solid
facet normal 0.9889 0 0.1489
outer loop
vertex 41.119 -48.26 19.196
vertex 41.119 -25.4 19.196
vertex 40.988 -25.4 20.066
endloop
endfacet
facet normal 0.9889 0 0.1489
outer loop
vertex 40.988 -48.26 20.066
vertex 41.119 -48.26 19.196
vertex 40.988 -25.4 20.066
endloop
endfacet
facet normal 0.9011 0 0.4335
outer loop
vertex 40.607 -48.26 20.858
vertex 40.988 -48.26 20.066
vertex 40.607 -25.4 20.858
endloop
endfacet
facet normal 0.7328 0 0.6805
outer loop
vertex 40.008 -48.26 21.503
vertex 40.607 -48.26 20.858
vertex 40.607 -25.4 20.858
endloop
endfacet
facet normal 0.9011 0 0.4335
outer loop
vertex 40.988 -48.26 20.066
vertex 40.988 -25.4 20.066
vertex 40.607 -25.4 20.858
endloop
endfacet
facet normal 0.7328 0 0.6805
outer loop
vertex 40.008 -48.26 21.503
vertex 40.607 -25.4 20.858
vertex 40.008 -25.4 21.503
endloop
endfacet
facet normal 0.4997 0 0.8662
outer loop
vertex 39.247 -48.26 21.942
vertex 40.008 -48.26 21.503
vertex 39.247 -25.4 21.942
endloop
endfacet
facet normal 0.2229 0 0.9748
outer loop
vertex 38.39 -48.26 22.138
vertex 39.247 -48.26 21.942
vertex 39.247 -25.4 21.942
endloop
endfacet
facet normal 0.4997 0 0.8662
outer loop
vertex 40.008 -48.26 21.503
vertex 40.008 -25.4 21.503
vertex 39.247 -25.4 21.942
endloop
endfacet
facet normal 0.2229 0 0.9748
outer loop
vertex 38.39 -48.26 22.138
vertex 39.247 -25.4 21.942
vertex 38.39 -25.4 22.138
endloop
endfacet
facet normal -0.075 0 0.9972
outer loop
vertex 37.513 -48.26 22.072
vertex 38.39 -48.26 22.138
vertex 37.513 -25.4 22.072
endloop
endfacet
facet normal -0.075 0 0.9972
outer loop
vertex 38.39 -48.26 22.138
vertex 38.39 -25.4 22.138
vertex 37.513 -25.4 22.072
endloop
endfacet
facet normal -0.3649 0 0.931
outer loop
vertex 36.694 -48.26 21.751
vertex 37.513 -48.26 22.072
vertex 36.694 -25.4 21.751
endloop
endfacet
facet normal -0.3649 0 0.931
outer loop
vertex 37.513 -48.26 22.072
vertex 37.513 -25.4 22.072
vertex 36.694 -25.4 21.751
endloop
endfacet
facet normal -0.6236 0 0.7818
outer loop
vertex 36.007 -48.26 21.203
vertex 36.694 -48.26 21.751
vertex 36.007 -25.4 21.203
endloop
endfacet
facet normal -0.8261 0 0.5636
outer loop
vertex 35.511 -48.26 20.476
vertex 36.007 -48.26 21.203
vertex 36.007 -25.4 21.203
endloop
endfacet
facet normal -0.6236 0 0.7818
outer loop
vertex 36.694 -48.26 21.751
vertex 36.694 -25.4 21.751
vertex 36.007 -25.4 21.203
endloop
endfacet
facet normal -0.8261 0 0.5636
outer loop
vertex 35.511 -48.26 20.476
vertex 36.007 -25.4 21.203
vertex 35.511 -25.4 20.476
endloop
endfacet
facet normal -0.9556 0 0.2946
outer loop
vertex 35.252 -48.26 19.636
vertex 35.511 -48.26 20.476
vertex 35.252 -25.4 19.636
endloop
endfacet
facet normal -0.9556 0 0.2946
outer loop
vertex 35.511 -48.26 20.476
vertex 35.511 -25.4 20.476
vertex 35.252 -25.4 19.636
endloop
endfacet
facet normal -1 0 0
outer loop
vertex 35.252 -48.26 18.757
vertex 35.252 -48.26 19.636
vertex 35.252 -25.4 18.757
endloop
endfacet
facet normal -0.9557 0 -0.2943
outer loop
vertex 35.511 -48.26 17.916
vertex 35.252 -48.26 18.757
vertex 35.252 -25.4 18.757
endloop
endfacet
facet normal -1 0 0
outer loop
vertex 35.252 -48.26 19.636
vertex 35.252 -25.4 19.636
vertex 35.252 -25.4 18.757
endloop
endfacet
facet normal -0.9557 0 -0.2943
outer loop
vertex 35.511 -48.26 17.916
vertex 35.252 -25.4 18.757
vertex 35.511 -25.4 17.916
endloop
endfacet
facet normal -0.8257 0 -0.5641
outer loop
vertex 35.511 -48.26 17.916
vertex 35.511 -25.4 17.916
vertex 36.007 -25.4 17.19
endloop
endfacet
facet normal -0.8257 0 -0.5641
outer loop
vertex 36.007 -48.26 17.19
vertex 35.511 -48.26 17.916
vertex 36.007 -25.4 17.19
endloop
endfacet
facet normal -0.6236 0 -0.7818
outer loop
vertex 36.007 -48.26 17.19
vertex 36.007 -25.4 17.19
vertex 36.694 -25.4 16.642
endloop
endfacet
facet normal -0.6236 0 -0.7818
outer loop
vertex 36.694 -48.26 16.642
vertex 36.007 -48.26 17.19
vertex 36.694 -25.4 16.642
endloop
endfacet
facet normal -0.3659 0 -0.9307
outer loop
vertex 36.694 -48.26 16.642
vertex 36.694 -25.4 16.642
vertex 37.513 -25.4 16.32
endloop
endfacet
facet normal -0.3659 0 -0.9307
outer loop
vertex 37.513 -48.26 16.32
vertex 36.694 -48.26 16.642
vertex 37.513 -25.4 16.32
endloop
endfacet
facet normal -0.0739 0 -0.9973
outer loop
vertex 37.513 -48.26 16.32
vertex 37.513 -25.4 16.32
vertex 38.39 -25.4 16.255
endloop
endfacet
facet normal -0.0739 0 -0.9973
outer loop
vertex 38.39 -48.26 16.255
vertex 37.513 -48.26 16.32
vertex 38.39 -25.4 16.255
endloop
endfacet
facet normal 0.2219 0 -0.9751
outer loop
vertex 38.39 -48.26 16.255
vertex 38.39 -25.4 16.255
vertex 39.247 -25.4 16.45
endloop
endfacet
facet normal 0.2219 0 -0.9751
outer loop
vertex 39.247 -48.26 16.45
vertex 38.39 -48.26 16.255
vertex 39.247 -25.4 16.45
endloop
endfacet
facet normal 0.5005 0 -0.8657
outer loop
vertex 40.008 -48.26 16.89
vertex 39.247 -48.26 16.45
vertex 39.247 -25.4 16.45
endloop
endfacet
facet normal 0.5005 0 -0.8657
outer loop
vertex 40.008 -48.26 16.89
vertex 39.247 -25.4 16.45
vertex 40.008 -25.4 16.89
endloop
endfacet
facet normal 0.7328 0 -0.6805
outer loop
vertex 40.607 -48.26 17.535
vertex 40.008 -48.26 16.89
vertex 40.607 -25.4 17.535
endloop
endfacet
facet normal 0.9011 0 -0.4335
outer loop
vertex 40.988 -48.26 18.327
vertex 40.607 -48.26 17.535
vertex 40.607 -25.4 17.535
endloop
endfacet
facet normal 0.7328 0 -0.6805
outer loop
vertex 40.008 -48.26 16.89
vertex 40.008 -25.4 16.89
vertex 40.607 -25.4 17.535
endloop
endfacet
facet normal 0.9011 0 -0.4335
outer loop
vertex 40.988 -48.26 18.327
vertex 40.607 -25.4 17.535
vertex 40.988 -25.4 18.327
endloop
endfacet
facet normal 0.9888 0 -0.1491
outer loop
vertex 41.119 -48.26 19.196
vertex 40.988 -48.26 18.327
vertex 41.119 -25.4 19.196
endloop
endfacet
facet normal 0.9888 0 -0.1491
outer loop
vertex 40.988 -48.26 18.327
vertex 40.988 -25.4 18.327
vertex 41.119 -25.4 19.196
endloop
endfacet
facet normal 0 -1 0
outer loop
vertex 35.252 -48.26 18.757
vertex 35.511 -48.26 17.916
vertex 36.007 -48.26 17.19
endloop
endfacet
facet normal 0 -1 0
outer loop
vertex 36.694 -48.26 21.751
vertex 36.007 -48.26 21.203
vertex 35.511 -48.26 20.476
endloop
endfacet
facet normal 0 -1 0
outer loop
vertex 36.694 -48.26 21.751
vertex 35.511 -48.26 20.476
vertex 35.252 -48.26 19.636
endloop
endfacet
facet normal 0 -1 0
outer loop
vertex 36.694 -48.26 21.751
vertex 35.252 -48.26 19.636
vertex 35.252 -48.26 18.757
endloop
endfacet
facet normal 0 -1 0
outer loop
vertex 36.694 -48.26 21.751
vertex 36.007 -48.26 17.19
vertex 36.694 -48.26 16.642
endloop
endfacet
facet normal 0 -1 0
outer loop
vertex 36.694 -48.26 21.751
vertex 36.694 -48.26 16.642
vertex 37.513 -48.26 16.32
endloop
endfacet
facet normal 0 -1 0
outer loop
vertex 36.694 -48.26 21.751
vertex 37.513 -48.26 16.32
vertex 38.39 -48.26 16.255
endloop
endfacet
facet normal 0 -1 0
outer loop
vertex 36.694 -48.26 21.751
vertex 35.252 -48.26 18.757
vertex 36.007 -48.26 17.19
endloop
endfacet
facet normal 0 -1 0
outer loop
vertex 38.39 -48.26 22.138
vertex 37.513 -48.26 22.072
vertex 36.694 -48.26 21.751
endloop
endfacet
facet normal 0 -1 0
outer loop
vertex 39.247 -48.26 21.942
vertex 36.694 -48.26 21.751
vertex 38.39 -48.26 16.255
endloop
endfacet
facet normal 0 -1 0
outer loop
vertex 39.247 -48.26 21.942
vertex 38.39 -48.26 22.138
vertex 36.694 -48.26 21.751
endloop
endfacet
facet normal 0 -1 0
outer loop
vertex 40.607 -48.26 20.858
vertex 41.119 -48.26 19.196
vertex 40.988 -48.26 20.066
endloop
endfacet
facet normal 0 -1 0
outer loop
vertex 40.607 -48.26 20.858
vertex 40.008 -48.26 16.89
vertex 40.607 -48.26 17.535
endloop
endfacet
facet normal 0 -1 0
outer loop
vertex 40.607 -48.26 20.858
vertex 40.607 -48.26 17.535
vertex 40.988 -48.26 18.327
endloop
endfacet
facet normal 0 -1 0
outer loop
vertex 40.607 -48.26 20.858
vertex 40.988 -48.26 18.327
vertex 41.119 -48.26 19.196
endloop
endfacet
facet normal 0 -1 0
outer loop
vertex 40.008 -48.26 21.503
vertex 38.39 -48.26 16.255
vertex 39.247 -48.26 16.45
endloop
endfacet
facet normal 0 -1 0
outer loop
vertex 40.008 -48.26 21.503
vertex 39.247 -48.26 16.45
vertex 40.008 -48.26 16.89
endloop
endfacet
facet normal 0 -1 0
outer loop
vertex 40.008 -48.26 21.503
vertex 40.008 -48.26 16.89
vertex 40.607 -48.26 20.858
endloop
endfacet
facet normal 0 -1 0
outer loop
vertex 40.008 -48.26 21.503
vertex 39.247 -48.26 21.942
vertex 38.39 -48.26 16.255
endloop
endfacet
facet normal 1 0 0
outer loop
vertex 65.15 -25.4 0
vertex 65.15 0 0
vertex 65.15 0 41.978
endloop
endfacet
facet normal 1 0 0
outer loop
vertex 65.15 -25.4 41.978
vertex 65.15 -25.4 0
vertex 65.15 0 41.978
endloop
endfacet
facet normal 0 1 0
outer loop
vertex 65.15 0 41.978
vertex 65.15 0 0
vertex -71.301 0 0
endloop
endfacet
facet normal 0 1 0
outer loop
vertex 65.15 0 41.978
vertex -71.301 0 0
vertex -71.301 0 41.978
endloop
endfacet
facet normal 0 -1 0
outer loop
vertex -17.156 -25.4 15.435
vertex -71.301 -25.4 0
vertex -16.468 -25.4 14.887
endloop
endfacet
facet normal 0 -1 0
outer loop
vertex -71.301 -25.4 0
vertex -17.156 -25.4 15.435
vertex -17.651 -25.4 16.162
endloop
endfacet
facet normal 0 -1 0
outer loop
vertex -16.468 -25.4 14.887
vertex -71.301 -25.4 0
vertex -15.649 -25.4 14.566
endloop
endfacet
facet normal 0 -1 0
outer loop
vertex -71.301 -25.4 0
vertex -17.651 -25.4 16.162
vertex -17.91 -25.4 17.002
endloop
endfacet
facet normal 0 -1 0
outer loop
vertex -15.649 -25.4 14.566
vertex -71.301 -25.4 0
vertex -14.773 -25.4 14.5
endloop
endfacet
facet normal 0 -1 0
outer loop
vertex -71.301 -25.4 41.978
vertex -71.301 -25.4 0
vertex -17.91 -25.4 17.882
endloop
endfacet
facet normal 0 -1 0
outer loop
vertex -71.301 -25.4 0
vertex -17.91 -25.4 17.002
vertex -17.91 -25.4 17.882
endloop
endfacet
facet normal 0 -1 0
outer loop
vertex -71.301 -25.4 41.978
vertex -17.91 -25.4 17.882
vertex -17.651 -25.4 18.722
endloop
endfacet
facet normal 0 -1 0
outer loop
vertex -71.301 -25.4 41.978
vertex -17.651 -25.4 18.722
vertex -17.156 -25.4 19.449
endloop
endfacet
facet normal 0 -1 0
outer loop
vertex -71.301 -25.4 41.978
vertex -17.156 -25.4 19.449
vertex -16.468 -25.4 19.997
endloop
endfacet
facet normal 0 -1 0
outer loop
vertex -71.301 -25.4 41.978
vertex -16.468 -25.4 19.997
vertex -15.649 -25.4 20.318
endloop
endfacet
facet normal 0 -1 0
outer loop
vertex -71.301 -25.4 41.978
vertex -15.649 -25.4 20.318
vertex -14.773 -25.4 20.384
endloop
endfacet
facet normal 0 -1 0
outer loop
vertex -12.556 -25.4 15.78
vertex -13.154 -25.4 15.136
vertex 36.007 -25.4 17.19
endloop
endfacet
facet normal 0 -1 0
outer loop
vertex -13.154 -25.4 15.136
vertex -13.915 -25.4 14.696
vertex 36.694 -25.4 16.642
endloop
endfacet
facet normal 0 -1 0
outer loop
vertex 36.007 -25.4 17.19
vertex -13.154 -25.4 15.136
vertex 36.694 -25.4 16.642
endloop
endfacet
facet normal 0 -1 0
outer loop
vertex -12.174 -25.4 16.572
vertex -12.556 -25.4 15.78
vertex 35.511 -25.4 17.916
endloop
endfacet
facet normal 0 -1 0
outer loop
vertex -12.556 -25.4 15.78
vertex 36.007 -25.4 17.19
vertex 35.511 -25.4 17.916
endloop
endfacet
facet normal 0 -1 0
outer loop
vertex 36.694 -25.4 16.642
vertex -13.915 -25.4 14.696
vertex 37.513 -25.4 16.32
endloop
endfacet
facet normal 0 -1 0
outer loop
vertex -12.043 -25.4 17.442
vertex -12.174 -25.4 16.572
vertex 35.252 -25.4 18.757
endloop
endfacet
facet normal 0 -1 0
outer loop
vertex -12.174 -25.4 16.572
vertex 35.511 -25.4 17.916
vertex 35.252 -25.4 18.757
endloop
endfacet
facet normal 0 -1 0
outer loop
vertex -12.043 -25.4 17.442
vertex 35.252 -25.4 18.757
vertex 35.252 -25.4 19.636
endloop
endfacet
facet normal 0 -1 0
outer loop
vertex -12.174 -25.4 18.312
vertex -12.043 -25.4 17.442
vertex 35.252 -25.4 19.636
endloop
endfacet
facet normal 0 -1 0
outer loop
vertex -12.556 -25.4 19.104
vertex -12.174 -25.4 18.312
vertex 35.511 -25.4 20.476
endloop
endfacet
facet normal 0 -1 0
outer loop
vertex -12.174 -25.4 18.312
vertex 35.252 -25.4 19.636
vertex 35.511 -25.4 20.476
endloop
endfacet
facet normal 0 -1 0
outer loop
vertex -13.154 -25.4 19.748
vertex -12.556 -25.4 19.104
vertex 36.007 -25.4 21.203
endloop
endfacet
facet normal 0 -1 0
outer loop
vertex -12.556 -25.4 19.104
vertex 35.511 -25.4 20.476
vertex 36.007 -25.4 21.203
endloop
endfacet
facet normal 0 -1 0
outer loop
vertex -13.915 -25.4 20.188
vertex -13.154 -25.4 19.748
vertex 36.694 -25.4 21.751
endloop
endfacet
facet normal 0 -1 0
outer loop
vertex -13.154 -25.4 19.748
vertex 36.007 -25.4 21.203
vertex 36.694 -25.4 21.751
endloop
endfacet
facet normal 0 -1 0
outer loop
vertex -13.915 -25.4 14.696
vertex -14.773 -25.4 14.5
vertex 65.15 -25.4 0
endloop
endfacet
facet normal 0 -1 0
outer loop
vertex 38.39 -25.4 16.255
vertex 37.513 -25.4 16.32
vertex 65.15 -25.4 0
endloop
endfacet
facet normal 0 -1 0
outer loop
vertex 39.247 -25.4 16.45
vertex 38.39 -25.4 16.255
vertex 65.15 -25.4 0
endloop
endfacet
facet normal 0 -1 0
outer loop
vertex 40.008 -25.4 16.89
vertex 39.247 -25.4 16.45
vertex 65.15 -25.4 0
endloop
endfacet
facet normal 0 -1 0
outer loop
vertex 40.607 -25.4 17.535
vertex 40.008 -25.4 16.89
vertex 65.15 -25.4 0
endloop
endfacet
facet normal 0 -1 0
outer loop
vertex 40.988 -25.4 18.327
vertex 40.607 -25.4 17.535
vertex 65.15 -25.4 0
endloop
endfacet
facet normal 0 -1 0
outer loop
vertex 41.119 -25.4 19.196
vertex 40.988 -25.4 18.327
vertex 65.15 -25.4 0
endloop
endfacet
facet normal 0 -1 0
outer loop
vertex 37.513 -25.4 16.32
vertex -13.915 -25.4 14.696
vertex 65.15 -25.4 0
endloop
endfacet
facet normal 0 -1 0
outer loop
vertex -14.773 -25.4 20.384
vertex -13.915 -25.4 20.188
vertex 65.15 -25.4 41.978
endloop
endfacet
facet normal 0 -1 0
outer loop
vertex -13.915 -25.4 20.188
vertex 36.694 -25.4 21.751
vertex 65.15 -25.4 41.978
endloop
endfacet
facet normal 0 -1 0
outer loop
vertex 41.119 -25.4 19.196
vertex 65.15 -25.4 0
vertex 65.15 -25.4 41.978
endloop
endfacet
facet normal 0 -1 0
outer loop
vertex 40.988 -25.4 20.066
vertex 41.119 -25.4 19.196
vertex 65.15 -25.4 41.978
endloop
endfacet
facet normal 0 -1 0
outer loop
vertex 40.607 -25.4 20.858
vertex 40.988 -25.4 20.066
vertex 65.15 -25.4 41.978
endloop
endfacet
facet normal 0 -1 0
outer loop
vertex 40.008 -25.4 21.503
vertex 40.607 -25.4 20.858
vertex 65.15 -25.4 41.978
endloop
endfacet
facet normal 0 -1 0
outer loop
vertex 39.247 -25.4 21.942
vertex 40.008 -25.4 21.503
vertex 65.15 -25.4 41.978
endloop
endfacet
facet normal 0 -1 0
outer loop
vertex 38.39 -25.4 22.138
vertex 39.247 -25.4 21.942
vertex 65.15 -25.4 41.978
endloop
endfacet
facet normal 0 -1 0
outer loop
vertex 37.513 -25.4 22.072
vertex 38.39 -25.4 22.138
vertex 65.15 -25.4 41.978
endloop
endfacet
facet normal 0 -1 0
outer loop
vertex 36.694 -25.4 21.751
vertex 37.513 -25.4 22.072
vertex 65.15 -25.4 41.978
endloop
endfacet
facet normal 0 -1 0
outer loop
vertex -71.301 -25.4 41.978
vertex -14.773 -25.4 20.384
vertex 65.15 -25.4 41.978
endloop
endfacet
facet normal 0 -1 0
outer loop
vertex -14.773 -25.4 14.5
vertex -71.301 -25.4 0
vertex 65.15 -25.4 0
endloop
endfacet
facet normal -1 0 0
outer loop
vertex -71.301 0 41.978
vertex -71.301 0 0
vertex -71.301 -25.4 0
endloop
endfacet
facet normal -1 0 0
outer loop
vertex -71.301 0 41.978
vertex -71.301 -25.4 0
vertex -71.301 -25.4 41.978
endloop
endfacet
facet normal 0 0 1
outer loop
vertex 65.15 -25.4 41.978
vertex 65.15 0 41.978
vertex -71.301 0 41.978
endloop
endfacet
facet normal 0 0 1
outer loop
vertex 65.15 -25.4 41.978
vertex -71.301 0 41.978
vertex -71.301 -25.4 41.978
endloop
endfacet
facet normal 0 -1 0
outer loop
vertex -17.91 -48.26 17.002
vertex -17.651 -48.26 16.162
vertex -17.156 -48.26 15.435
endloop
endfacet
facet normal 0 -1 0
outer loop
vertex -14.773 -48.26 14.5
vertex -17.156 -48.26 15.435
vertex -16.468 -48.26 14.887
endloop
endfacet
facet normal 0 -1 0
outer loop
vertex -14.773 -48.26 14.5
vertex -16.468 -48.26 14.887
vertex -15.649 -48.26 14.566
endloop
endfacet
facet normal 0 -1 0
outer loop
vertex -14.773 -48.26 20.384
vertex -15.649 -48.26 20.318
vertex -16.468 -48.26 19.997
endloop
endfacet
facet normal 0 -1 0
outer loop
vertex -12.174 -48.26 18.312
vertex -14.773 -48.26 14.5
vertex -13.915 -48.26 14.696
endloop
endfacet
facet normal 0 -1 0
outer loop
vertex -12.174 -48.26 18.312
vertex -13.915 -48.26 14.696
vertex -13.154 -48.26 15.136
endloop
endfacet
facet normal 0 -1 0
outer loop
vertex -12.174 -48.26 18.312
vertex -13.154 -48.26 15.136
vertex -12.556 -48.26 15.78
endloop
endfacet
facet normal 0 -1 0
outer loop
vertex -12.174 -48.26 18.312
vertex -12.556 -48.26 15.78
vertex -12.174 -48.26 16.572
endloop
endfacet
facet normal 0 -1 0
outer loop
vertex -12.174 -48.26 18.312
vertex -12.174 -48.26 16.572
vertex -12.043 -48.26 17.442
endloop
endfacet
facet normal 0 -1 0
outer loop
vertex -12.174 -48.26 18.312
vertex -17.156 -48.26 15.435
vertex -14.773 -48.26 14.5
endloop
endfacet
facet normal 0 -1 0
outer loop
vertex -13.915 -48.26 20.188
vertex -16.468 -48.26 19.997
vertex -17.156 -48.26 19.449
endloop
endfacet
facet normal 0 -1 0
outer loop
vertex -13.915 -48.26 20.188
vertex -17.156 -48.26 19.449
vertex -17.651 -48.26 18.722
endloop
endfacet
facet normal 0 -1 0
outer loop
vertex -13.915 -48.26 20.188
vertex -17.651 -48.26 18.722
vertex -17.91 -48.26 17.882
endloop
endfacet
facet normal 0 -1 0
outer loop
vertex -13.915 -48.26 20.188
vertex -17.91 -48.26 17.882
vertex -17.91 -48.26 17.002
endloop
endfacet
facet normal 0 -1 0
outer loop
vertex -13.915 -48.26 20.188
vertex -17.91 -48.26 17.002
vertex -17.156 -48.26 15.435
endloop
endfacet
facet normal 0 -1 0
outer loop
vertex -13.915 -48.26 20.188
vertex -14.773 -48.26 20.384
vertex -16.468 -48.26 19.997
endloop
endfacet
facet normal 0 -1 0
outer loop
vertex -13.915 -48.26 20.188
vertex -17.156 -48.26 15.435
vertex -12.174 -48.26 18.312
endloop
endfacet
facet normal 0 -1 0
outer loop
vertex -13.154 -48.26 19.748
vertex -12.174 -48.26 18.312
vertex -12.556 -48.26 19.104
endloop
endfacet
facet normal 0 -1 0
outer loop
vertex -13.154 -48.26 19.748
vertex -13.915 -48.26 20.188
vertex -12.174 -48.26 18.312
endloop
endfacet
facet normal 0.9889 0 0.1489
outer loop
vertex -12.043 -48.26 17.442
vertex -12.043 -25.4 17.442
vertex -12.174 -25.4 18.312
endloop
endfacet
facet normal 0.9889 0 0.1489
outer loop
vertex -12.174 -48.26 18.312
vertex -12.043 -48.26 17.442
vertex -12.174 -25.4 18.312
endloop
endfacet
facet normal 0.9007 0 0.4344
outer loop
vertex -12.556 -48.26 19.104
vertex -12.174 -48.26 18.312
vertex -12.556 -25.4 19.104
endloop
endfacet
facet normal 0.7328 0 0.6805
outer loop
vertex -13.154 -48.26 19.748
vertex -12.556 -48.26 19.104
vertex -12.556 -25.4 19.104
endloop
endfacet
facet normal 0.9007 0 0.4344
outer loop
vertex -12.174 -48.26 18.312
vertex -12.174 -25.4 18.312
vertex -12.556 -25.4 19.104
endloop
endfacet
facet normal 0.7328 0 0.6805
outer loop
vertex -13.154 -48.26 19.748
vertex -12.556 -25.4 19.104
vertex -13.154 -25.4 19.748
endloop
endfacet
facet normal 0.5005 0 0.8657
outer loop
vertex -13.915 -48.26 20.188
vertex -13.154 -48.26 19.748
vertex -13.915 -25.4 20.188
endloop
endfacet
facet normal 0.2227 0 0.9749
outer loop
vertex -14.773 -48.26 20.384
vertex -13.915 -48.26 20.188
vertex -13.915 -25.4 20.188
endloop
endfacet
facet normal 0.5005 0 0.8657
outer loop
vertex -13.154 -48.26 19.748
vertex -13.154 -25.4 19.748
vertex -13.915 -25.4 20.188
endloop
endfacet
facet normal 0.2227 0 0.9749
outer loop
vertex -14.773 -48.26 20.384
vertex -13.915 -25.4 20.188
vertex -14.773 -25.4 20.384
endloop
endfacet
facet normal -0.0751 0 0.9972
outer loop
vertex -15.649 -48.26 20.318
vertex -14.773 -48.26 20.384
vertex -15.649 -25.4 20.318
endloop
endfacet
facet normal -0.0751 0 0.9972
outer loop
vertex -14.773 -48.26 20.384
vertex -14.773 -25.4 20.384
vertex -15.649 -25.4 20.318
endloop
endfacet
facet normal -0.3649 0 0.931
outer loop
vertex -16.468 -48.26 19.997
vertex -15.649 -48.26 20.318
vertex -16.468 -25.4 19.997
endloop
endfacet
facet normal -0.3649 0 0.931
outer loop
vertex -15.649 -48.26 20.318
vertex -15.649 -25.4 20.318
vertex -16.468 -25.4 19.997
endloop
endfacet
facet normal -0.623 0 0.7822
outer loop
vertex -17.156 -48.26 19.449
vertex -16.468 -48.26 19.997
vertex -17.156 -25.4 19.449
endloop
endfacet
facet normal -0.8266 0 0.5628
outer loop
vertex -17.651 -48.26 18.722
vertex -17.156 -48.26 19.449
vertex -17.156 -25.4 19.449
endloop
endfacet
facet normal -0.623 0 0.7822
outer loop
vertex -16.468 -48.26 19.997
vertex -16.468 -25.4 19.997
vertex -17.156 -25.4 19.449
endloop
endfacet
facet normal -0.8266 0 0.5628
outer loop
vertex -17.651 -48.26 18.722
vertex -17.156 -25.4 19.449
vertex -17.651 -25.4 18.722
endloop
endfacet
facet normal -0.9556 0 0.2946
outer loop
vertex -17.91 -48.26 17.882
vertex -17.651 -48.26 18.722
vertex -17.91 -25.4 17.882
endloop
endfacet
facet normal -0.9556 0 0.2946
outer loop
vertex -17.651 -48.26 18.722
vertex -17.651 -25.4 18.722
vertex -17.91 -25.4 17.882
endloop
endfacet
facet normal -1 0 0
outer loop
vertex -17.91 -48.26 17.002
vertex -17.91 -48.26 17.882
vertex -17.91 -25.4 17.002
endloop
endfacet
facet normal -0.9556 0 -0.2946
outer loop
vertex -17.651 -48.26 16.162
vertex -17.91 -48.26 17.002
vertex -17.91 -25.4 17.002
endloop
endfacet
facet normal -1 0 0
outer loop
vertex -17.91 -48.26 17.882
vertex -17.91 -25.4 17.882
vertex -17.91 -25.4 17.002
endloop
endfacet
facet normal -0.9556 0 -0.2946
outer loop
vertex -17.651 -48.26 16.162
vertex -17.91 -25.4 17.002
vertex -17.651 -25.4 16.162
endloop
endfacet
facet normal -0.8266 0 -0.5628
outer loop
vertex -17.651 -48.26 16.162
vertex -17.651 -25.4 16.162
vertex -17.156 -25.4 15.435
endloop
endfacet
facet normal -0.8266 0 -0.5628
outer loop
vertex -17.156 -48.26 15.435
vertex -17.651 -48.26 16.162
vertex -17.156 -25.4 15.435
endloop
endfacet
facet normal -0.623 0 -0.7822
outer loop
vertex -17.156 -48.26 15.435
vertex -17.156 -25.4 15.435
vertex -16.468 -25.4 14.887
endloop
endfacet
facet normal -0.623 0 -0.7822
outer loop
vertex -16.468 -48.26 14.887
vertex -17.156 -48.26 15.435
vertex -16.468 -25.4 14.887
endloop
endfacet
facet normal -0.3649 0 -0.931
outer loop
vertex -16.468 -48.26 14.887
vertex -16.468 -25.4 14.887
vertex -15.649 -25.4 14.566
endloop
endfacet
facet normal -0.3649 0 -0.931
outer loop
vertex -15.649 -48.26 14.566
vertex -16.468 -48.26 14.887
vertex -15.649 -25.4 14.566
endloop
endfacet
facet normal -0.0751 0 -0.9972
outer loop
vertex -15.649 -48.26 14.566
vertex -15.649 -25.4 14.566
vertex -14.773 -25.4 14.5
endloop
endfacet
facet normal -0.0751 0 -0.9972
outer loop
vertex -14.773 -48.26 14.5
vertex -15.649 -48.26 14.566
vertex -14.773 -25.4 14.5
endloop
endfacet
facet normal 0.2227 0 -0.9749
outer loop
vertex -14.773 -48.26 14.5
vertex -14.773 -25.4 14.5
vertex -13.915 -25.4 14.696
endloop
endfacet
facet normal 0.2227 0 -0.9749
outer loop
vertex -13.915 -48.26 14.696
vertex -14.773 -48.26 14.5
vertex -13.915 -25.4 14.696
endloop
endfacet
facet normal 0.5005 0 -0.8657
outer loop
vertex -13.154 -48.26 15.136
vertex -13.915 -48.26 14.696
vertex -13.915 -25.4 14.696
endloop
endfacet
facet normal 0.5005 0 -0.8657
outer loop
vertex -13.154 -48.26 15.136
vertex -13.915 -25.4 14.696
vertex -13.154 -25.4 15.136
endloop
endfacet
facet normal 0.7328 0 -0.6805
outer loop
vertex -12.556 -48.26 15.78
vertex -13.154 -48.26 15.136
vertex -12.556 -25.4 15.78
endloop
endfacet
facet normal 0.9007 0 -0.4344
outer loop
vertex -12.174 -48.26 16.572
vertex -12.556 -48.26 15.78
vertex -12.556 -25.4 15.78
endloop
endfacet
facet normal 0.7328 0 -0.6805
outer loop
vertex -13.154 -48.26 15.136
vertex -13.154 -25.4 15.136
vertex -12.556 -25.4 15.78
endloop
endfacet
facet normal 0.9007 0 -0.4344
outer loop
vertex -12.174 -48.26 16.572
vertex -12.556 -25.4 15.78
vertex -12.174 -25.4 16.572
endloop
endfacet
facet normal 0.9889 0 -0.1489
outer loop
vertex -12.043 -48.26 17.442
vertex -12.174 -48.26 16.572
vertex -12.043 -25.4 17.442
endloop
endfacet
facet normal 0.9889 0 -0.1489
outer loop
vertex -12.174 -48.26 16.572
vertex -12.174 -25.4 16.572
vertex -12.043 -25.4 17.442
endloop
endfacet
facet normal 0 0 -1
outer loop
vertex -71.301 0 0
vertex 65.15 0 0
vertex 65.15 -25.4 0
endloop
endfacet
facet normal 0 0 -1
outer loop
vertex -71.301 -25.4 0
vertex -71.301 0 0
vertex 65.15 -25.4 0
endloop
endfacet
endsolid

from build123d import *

# Parameters (mm, degrees)
F0_W     = 65.1499927044
F0_H     = 41.9776812196
F1_DEPTH = 25.4
F2_R     = 2.95
F3_DEPTH = 22.86
F4_DEPTH = 71.30122


with BuildPart() as f1:
    # F0 (on Front) → F1 (new body)
    with BuildSketch(Plane.XZ):
        with Locations((32.5749963522, 20.9888406098)):
            Rectangle(F0_W, F0_H)
    extrude(amount=F1_DEPTH)

    # F2 (on face) → F3, piece 2 (join)
    with BuildSketch(Plane.XZ.offset(25.4)):
        with Locations((38.1691530347, 19.1963799298)):
            Circle(F2_R)
    extrude(amount=F3_DEPTH)

    # F4 (add): a face of the model
    f4_faces = [f1.faces().sort_by_distance(p)[0] for p in [
        (0, -12.7, 20.9888406098),
    ]]


with BuildPart() as f3:
    # F2 (on face) → F3 (new body)
    with BuildSketch(Plane.XZ.offset(25.4)):
        with Locations((-14.9930469653, 17.4420047551)):
            Circle(F2_R)
    extrude(amount=F3_DEPTH)


with BuildPart() as f1_1:
    add(f1.part)

    add(f3.part)  # F4 merges F3
    extrude(f4_faces, amount=F4_DEPTH)


solid = f1_1.part
